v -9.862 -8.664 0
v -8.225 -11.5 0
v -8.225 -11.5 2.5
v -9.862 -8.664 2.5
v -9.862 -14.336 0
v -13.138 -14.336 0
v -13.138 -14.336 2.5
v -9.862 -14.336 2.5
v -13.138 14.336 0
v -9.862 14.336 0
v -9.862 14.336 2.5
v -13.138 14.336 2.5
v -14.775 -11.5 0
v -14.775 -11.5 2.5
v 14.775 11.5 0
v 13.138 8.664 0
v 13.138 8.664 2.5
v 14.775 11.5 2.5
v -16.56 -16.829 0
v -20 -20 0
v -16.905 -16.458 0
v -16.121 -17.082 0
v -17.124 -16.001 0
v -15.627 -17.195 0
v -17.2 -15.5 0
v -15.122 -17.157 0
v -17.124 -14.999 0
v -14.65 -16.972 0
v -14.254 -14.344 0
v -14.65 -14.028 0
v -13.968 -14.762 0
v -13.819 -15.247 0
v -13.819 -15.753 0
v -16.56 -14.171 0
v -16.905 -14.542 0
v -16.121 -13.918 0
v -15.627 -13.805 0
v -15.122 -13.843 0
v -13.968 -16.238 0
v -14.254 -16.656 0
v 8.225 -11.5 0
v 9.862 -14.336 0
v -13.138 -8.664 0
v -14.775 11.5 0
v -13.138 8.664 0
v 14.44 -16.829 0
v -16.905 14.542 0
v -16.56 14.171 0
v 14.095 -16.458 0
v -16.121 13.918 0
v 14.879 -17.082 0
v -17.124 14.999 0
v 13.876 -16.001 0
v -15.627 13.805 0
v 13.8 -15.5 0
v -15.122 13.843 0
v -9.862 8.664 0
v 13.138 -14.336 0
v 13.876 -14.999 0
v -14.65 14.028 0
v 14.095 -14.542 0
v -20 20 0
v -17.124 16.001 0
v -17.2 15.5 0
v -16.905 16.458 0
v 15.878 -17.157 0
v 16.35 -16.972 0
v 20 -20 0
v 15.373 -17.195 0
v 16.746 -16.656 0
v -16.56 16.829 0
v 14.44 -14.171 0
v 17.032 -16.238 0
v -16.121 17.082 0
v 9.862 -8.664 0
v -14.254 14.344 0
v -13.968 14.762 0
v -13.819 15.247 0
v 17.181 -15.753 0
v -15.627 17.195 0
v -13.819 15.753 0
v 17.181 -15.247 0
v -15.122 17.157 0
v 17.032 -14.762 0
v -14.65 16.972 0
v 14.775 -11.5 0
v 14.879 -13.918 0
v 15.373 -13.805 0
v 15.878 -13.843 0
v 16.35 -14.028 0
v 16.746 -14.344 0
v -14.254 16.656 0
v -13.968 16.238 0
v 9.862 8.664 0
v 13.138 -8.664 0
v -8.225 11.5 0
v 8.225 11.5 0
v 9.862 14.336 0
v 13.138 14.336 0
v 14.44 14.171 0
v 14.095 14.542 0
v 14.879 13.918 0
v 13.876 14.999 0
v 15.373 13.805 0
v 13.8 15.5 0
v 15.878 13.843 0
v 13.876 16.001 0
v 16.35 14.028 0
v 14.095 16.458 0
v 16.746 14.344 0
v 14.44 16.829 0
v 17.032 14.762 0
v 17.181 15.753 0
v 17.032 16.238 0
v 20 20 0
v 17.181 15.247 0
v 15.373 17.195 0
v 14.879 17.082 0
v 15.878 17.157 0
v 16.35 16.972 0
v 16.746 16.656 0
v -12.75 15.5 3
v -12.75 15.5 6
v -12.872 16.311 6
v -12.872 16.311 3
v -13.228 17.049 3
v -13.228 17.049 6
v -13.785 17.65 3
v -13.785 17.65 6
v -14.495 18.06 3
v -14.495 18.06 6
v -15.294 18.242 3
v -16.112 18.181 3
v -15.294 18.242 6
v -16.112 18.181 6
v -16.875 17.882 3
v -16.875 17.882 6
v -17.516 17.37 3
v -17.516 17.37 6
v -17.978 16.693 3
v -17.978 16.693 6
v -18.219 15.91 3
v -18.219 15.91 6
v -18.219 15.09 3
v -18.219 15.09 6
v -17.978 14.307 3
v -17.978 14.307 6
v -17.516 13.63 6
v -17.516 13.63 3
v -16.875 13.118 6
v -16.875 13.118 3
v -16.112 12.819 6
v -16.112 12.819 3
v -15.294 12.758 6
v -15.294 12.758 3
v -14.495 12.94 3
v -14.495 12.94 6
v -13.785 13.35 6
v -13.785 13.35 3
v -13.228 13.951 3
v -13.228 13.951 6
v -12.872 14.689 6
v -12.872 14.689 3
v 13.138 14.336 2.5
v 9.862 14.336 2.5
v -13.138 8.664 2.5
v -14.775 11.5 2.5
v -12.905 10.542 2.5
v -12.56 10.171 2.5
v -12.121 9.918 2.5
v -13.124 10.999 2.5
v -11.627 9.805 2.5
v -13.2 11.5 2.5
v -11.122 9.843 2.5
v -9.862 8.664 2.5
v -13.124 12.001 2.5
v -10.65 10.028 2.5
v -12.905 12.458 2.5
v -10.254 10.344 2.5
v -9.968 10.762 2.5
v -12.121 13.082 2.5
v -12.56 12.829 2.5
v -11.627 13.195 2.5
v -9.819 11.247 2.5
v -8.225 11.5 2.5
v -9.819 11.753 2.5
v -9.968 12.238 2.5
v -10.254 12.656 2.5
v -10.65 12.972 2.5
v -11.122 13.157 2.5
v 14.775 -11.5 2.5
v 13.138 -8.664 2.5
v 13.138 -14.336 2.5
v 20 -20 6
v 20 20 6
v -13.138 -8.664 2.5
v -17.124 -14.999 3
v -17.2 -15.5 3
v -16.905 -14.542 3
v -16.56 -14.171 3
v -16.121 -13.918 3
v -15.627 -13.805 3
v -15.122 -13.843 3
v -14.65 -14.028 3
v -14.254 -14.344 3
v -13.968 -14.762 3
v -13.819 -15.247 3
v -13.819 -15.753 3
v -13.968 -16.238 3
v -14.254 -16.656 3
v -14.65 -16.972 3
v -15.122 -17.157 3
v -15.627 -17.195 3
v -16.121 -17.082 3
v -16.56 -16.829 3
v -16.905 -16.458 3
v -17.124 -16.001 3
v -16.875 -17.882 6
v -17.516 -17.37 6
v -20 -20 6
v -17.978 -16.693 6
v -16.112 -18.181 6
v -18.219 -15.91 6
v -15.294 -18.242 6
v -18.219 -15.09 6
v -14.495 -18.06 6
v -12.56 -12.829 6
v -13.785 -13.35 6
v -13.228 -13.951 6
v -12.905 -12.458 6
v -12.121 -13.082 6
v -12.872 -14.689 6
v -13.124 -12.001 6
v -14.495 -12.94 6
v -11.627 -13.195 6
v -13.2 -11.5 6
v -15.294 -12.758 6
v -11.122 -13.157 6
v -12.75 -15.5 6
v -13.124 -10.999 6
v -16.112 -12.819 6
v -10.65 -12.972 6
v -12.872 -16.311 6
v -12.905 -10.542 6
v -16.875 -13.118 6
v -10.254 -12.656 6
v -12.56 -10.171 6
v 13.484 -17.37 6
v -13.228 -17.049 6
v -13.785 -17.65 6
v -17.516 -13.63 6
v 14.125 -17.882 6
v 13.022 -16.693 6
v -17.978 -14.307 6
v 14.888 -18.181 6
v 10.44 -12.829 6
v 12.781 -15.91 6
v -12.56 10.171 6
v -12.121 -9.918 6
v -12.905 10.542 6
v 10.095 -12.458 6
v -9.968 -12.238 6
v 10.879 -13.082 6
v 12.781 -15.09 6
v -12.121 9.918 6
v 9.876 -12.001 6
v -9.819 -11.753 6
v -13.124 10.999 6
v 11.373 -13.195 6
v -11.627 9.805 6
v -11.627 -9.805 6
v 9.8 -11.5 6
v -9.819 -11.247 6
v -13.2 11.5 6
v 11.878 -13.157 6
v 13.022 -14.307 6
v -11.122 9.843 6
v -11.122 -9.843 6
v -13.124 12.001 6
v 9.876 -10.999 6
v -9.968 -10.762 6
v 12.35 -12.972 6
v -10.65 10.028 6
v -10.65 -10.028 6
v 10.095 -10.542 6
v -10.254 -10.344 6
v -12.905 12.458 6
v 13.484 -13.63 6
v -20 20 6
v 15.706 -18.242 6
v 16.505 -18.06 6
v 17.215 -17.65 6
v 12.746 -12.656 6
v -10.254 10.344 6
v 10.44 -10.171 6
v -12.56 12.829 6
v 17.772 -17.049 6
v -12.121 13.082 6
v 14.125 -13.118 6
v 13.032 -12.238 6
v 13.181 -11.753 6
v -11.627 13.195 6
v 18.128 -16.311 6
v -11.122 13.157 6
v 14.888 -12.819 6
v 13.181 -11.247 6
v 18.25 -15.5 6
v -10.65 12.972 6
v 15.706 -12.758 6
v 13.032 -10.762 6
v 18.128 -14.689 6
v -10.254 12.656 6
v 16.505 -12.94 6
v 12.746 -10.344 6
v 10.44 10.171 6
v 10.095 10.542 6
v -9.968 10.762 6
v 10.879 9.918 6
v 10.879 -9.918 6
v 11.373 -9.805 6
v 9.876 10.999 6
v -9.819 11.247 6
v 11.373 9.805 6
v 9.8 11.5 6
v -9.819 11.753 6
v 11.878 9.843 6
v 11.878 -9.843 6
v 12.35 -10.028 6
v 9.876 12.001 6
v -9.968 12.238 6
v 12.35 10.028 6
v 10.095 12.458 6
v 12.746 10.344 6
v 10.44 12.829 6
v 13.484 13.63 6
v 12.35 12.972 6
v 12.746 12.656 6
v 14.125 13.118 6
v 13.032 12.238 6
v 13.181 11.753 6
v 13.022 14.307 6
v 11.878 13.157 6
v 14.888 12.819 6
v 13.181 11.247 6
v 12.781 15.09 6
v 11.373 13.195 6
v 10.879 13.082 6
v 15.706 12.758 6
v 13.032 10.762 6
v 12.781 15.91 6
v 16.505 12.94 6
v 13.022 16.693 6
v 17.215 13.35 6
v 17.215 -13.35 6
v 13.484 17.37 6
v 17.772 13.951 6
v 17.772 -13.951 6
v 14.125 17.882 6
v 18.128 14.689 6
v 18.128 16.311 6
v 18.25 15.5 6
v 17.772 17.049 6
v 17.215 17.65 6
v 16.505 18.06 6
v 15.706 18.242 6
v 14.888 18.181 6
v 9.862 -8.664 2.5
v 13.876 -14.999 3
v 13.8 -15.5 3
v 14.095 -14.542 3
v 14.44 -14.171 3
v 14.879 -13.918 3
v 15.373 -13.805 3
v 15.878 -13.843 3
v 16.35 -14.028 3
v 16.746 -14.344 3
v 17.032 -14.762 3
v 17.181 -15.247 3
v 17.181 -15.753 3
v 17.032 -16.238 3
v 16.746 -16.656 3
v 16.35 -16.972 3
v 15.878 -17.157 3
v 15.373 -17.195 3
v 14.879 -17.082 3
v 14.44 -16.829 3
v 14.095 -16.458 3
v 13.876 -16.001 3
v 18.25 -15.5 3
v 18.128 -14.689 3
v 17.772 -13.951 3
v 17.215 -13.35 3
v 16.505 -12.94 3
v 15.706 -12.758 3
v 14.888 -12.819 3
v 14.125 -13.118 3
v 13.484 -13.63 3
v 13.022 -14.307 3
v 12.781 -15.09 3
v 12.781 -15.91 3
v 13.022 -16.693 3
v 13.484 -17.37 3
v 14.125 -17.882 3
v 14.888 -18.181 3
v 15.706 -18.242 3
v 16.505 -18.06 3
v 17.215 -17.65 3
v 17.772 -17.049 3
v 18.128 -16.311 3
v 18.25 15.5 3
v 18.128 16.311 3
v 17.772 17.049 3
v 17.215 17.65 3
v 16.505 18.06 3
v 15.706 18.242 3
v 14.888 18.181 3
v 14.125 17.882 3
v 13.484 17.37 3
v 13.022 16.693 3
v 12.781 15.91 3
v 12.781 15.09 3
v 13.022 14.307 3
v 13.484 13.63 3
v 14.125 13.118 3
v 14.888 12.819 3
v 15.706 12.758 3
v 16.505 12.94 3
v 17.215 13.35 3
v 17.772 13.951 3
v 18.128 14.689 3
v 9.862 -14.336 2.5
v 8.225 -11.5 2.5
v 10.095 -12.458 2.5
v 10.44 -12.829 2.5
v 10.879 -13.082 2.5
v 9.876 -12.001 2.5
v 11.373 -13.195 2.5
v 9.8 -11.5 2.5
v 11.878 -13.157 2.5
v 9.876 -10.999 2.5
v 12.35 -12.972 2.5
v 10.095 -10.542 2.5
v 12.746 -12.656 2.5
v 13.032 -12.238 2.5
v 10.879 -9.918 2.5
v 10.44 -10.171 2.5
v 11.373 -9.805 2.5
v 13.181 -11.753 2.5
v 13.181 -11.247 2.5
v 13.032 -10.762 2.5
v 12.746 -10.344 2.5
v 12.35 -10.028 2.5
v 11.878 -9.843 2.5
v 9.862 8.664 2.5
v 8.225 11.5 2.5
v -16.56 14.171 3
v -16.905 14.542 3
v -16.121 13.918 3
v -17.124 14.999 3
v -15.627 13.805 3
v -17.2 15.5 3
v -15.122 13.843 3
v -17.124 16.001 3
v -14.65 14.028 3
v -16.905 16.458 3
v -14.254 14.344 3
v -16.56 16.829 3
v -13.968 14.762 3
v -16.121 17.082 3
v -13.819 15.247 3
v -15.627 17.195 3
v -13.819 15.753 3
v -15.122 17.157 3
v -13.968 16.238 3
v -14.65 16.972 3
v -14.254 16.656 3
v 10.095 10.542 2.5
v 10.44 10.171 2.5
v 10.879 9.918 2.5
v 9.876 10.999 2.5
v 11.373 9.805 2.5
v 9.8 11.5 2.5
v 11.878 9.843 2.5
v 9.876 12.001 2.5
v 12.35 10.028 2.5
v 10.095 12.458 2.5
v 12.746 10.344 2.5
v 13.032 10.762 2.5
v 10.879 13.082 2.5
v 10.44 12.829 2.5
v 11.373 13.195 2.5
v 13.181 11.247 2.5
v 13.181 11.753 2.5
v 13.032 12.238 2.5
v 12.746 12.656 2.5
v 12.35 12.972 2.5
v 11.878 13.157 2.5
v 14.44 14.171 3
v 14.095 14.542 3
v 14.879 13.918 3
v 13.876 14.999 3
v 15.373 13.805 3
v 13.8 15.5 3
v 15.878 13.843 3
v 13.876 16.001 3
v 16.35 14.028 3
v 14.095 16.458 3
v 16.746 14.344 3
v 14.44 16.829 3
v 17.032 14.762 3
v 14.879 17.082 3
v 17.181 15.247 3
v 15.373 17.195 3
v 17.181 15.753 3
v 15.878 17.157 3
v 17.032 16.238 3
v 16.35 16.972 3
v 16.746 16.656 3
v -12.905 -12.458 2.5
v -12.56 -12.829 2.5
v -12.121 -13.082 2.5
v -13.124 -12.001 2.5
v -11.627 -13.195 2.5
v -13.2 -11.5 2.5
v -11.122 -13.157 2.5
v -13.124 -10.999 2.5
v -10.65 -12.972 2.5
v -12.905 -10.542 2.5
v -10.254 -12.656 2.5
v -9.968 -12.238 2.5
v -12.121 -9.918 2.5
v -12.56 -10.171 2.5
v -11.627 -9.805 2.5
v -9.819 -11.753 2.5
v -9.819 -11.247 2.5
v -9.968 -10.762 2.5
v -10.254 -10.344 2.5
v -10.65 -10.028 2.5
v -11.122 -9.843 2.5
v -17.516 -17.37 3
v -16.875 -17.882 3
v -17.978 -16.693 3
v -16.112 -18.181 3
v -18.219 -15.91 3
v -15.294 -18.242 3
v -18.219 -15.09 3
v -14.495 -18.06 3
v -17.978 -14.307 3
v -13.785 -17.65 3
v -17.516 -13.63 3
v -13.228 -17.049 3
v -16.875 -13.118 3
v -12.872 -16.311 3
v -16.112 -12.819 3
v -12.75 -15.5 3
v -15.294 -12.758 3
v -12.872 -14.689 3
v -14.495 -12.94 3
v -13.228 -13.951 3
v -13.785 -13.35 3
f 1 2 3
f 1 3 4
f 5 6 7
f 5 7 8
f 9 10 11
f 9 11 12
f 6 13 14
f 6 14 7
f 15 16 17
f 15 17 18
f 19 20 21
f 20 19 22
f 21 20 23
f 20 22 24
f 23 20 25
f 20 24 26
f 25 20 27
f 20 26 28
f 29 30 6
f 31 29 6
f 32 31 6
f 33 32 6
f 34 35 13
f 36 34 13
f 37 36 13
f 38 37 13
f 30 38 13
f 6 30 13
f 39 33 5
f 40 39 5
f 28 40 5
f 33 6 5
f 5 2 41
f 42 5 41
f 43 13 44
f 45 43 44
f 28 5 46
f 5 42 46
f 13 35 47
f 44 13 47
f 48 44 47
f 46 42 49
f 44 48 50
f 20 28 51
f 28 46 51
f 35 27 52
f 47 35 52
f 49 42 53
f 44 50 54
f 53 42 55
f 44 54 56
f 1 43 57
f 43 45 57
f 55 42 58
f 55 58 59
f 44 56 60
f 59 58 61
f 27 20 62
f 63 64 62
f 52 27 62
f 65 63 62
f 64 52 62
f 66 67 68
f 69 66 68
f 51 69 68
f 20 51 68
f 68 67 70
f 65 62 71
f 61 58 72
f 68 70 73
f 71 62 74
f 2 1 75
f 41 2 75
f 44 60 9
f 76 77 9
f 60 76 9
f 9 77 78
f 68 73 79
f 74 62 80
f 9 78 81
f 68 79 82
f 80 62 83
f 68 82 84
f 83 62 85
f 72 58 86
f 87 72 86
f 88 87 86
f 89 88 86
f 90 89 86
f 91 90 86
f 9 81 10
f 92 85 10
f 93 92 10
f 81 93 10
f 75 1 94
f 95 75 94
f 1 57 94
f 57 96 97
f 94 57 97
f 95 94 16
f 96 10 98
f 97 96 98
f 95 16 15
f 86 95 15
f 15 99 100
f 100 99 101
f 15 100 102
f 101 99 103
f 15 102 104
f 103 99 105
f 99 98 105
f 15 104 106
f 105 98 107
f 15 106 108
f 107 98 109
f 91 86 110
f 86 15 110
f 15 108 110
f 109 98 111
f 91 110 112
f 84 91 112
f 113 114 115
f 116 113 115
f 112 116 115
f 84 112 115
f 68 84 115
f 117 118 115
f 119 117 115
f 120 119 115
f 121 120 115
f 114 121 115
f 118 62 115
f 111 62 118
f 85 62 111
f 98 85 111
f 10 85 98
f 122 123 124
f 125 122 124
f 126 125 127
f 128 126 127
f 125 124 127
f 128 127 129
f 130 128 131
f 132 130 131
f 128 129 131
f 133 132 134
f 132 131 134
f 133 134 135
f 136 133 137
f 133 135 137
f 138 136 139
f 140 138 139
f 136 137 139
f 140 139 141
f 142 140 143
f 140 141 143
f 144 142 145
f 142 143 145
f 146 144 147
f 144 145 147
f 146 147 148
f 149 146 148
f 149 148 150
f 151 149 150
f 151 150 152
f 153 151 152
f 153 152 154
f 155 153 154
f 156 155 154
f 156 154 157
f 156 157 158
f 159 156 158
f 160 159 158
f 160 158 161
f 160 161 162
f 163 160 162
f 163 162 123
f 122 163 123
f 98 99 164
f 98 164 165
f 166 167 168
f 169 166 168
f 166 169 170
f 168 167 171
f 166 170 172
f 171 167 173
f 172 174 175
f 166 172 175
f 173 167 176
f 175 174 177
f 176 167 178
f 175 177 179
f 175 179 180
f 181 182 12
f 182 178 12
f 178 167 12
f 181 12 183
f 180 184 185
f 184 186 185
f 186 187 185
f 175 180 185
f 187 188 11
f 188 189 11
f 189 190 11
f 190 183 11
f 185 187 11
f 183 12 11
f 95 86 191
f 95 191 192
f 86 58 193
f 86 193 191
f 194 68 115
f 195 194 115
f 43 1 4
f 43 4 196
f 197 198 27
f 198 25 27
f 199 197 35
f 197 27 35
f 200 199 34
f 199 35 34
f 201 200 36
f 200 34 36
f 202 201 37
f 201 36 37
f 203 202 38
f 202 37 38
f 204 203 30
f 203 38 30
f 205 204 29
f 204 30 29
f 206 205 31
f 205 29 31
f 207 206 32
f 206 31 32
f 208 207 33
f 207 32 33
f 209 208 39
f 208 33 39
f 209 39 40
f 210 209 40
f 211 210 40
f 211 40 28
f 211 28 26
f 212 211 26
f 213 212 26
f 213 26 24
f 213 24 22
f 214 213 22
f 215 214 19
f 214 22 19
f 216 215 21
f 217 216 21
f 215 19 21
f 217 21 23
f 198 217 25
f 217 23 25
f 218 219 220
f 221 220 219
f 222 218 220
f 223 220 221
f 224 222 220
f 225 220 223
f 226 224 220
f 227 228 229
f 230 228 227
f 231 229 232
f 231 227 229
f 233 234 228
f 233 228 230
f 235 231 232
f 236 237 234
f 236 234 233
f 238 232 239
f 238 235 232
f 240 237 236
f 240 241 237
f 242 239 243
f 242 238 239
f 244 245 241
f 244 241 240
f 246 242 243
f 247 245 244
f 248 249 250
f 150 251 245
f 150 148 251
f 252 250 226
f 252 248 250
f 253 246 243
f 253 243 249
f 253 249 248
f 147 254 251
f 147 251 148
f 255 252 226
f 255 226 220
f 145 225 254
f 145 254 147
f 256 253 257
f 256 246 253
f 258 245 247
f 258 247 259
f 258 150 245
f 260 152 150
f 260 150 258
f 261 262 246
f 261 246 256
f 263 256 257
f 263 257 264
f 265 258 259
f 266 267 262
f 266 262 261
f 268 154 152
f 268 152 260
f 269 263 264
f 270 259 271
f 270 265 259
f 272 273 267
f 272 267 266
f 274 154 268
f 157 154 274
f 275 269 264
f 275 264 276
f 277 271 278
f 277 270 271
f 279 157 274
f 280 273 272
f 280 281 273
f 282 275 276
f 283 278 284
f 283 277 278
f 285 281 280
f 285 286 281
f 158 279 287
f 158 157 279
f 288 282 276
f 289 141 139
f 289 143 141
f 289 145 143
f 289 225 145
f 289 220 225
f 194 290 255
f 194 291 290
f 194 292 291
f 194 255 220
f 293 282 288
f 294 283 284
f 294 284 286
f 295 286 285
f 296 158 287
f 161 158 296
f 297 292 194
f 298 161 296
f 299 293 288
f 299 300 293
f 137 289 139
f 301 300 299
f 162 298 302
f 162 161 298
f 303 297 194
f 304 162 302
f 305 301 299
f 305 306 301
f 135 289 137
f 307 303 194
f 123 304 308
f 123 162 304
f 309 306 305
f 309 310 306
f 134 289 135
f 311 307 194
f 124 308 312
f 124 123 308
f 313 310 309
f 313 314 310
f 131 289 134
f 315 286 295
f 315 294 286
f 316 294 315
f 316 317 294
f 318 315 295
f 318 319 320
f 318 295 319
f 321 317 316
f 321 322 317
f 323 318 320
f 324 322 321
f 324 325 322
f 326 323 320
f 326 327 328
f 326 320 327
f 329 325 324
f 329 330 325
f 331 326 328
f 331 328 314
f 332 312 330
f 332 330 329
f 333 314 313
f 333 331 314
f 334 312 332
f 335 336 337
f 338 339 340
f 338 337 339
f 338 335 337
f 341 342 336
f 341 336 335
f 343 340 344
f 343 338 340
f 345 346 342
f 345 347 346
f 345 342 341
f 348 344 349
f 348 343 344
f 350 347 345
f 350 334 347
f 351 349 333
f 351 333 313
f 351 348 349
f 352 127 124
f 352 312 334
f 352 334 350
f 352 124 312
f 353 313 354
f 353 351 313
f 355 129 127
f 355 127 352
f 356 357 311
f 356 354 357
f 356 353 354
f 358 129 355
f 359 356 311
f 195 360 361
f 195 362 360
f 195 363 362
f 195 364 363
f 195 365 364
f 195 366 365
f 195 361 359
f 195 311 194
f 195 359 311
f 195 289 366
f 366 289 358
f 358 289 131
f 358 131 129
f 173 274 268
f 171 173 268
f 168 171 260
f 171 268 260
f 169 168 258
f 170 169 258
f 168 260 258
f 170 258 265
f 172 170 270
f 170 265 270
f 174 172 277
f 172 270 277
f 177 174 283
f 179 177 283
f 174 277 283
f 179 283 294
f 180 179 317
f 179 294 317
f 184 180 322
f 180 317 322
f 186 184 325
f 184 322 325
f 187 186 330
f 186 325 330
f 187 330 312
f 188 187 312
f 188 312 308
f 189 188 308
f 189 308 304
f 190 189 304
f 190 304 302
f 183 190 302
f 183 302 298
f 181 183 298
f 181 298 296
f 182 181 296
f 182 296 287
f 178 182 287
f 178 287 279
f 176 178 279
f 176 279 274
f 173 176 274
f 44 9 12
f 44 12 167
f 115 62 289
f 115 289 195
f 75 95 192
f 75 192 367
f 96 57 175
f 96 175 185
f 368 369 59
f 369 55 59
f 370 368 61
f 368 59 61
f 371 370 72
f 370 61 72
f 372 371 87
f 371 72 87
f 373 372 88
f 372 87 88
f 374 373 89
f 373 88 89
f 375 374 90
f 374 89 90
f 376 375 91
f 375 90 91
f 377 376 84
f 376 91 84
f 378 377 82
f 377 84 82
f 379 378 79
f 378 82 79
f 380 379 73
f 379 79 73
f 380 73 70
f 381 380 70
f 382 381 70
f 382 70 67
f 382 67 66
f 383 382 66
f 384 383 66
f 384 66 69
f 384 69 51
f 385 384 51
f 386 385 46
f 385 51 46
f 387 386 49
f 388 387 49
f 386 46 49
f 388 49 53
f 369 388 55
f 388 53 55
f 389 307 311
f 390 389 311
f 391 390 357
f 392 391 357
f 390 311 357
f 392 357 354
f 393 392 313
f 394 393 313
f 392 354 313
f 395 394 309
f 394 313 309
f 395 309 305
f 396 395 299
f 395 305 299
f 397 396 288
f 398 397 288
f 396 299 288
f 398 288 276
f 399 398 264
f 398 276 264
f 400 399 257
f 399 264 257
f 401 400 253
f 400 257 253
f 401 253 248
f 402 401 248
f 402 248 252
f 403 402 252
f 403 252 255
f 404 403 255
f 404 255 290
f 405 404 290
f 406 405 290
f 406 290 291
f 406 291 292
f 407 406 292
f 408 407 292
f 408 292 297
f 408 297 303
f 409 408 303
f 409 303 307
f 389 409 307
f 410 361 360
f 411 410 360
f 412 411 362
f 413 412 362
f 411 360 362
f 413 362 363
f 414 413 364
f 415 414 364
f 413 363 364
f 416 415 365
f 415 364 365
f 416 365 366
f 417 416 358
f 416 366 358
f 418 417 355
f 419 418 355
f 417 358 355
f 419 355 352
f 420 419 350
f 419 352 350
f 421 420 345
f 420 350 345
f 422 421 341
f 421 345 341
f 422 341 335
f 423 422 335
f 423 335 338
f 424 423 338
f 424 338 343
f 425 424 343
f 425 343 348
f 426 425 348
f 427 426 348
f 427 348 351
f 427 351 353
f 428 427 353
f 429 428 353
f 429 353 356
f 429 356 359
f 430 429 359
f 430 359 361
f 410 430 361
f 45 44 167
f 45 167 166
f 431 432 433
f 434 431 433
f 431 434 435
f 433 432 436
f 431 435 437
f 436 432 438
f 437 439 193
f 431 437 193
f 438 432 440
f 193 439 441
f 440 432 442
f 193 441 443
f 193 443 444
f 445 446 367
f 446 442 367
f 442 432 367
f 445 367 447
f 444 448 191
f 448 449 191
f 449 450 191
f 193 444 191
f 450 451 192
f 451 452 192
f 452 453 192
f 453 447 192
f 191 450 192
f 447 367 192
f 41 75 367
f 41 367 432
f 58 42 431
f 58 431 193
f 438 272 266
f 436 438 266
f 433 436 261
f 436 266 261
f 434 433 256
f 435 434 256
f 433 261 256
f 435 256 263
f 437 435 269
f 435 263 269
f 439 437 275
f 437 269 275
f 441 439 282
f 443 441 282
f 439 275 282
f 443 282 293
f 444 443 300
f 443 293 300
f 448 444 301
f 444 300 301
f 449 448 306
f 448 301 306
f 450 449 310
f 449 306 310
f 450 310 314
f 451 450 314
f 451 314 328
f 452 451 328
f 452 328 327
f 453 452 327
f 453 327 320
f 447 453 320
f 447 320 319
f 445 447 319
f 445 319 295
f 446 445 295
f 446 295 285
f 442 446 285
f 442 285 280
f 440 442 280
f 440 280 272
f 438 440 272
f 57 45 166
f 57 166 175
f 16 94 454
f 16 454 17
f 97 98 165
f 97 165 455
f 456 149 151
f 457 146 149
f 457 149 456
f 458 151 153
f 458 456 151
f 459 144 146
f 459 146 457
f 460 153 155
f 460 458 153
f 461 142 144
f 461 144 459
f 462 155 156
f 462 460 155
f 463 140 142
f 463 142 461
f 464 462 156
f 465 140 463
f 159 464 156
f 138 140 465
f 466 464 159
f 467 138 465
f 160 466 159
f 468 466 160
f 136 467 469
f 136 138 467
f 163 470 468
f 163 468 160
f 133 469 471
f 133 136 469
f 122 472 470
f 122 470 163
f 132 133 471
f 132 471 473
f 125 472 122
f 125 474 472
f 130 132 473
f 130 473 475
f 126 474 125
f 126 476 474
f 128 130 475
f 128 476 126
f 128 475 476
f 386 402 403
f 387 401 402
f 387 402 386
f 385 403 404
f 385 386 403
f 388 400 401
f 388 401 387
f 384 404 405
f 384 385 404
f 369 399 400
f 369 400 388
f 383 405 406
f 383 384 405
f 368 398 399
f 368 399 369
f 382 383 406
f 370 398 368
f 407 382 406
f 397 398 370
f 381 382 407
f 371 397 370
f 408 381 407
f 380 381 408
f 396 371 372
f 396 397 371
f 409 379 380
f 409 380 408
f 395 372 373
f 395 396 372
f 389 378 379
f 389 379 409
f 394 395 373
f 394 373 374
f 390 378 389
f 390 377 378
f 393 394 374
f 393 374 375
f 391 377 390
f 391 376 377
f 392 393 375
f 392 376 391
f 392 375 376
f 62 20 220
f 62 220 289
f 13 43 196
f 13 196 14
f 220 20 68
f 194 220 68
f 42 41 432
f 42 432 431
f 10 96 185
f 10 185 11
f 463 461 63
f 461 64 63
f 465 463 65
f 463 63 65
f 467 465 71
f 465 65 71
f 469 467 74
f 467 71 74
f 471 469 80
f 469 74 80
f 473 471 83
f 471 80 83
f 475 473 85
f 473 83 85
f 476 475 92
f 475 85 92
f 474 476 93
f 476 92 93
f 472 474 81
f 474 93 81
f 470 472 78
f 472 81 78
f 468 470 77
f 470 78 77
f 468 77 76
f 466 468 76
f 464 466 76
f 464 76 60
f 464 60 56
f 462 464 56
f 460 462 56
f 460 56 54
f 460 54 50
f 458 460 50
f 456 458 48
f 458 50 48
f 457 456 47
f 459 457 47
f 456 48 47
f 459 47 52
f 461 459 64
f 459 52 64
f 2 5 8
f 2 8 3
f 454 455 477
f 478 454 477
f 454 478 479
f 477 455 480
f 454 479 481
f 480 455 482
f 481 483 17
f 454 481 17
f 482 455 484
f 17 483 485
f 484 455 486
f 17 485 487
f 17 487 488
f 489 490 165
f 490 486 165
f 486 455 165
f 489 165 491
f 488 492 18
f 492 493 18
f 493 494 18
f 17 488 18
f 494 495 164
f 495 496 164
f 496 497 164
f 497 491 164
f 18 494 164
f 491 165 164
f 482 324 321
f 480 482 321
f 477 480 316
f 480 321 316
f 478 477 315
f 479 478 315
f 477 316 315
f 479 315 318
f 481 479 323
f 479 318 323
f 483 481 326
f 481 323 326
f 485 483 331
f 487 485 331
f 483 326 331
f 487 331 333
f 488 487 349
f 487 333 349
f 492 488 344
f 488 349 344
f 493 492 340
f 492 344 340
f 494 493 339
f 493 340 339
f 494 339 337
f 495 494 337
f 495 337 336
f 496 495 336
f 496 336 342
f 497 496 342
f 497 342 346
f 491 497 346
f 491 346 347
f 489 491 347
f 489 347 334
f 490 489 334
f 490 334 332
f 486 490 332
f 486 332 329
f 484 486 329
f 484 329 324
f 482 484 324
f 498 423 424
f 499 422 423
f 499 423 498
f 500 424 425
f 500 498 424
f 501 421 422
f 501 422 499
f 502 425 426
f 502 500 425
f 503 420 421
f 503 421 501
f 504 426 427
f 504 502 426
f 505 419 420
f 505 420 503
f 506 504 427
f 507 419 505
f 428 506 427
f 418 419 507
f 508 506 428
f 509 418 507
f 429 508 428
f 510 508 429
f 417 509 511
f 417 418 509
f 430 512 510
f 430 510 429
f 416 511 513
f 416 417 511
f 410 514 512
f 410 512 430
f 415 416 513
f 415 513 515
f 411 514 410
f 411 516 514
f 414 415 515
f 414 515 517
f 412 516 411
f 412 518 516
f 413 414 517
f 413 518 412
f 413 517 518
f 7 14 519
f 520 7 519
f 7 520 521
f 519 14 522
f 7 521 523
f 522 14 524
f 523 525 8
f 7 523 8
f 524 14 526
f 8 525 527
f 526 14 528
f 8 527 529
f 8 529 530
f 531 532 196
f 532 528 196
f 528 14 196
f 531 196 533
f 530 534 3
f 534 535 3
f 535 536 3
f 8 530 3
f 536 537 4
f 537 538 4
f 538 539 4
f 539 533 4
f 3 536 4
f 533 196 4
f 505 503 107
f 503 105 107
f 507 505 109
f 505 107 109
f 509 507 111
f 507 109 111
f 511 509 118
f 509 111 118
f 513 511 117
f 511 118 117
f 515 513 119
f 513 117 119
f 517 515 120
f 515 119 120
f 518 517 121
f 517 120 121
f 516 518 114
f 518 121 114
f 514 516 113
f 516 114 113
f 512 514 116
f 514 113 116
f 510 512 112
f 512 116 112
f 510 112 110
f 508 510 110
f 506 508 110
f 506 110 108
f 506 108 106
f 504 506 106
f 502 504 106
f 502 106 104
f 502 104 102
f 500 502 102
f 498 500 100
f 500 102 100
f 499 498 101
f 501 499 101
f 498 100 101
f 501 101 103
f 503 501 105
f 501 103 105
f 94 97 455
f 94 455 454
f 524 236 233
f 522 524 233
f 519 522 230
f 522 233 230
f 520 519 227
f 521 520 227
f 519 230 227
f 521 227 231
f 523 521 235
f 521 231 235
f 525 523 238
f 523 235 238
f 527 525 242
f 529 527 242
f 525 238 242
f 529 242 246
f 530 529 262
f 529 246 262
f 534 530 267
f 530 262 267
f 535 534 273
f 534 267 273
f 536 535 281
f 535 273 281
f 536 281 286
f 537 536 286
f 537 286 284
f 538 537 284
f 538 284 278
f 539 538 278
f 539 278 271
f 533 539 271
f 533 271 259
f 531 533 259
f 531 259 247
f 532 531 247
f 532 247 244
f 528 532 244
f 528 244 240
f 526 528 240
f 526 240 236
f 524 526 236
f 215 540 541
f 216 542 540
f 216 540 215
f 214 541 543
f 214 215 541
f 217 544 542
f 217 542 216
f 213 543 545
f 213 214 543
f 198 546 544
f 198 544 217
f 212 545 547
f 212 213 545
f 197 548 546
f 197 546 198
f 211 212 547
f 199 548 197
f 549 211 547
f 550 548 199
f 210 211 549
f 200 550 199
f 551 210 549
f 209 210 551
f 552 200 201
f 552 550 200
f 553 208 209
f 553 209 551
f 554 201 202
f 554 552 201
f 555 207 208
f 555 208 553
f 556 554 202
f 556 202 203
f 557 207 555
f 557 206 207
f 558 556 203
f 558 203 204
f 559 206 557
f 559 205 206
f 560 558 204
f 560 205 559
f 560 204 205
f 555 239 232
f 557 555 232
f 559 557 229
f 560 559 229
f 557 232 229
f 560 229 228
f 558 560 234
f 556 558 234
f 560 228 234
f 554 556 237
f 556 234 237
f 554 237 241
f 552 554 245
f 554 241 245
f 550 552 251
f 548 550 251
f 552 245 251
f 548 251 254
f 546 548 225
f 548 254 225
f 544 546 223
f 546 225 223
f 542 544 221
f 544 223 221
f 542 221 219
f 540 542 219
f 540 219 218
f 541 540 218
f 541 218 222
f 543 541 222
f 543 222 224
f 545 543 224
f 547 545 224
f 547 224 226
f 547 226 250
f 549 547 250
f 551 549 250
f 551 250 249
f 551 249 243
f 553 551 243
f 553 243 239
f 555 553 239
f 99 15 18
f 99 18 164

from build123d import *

# Parameters (mm, degrees)
F0_W           = 40
F0_H           = 40
F1_DEPTH       = 6
F4_D           = 3.4
F4_CBORE_D     = 5.5
F4_CBORE_DEPTH = 3
F5_D           = 3.4
F6_DEPTH       = 2.5


with BuildPart() as f1:
    # F0 (on Top) → F1 (new body)
    with BuildSketch(Plane.XY):
        Rectangle(F0_W, F0_H)
    extrude(amount=F1_DEPTH)

    # F4 (through all)
    with Locations(Plane.XY.offset(6)):
        with Locations((-15.5, 15.5), (15.5, 15.5), (15.5, -15.5), (-15.5, -15.5)):
            CounterBoreHole(F4_D / 2, F4_CBORE_D / 2, F4_CBORE_DEPTH)

    # F5 (through all)
    with Locations(Plane(origin=(0, 0, 0), x_dir=(1, 0, 0), z_dir=(0, 0, -1))):
        with Locations((-11.5, -11.5), (11.5, -11.5), (11.5, 11.5), (-11.5, 11.5)):
            Hole(F5_D / 2)

    # F3 (on face) → F6 (cut)
    with BuildSketch(Plane.XY):
        Polygon((-9.8625, 8.663767), (-8.225, 11.5), (-9.8625, 14.336233), (-13.1375, 14.336233), (-14.775, 11.5), (-13.1375, 8.663767), align=None)
        Polygon((-9.8625, -14.336233), (-8.225, -11.5), (-9.8625, -8.663767), (-13.1375, -8.663767), (-14.775, -11.5), (-13.1375, -14.336233), align=None)
        Polygon((8.225, -11.5), (9.8625, -14.336233), (13.1375, -14.336233), (14.775, -11.5), (13.1375, -8.663767), (9.8625, -8.663767), align=None)
        Polygon((8.225, 11.5), (9.8625, 8.663767), (13.1375, 8.663767), (14.775, 11.5), (13.1375, 14.336233), (9.8625, 14.336233), align=None)
    extrude(amount=F6_DEPTH, mode=Mode.SUBTRACT)


solid = f1.part
